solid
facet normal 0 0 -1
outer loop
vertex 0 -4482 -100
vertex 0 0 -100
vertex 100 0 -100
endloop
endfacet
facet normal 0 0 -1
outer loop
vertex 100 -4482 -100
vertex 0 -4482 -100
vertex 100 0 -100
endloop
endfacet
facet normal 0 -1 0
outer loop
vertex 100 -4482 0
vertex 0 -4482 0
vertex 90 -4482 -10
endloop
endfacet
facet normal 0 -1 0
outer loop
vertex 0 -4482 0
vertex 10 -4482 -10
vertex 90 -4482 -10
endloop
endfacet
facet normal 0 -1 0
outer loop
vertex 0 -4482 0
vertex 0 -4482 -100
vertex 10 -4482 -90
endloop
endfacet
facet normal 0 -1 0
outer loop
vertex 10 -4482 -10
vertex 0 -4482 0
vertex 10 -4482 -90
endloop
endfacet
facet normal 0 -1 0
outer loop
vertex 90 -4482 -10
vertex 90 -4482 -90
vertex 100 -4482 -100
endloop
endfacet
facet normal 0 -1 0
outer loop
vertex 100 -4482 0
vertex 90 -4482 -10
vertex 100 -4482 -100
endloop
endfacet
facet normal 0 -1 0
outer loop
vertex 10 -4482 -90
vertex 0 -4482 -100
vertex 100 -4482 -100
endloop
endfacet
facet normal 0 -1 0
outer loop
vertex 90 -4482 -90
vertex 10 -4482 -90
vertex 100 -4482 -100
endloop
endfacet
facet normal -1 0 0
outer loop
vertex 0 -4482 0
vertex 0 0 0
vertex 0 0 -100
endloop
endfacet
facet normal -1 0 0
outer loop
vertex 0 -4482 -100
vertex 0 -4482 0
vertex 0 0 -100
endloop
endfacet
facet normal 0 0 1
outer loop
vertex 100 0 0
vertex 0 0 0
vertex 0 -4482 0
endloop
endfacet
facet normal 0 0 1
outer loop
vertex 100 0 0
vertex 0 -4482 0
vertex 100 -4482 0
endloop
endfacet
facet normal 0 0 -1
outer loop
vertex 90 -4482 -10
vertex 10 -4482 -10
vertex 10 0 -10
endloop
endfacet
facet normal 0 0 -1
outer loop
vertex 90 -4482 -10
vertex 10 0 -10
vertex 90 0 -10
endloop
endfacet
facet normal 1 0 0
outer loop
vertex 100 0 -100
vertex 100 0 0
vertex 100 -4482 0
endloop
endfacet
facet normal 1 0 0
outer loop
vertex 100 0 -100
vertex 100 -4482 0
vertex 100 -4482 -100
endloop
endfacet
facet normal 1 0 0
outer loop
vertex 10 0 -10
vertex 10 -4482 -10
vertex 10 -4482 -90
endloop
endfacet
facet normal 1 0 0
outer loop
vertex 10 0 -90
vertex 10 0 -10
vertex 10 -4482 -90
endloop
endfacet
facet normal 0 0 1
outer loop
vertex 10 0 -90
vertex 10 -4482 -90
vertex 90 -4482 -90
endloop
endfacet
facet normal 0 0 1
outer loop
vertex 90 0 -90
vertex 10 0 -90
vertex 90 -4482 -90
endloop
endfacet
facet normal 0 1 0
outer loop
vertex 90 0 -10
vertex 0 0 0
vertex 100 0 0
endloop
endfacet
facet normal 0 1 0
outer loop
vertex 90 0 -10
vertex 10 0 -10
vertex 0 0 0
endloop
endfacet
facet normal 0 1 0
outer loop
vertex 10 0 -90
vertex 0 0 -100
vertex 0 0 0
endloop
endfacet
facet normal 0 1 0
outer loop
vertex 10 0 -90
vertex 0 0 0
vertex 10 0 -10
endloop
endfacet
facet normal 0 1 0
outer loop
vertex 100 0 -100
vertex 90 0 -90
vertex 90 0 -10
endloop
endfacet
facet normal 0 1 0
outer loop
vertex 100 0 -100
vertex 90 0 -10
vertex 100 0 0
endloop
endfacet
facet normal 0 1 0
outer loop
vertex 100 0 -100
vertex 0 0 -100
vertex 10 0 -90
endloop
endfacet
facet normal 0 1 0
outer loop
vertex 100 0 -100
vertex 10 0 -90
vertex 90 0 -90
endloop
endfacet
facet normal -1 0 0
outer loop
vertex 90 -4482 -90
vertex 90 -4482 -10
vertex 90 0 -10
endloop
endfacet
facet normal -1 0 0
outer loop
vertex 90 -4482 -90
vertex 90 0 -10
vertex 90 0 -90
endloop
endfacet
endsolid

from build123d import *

# Parameters (mm, degrees)
SKETCH1_W           = 100
SKETCH1_H           = 100
BOSS_EXTRUDE1_DEPTH = 4482
SKETCH5_W           = 80
SKETCH5_H           = 80
CUT_EXTRUDE1_DEPTH  = 4485.230591751


with BuildPart() as part:
    # Sketch1 → Boss-Extrude1 (new body)
    with BuildSketch(Plane(origin=(0, 0, 0), x_dir=(1, 0, 0), z_dir=(0, 1, 0))):
        with Locations((50, 50)):
            Rectangle(SKETCH1_W, SKETCH1_H)
    extrude(amount=-BOSS_EXTRUDE1_DEPTH)

    # Sketch5 → Cut-Extrude1 (cut, through all)
    with BuildSketch(Plane(origin=(0, 0, 0), x_dir=(1, 0, 0), z_dir=(0, 1, 0))):
        with Locations((50, 50)):
            Rectangle(SKETCH5_W, SKETCH5_H)
    extrude(amount=-CUT_EXTRUDE1_DEPTH, mode=Mode.SUBTRACT)


solid = part.part
